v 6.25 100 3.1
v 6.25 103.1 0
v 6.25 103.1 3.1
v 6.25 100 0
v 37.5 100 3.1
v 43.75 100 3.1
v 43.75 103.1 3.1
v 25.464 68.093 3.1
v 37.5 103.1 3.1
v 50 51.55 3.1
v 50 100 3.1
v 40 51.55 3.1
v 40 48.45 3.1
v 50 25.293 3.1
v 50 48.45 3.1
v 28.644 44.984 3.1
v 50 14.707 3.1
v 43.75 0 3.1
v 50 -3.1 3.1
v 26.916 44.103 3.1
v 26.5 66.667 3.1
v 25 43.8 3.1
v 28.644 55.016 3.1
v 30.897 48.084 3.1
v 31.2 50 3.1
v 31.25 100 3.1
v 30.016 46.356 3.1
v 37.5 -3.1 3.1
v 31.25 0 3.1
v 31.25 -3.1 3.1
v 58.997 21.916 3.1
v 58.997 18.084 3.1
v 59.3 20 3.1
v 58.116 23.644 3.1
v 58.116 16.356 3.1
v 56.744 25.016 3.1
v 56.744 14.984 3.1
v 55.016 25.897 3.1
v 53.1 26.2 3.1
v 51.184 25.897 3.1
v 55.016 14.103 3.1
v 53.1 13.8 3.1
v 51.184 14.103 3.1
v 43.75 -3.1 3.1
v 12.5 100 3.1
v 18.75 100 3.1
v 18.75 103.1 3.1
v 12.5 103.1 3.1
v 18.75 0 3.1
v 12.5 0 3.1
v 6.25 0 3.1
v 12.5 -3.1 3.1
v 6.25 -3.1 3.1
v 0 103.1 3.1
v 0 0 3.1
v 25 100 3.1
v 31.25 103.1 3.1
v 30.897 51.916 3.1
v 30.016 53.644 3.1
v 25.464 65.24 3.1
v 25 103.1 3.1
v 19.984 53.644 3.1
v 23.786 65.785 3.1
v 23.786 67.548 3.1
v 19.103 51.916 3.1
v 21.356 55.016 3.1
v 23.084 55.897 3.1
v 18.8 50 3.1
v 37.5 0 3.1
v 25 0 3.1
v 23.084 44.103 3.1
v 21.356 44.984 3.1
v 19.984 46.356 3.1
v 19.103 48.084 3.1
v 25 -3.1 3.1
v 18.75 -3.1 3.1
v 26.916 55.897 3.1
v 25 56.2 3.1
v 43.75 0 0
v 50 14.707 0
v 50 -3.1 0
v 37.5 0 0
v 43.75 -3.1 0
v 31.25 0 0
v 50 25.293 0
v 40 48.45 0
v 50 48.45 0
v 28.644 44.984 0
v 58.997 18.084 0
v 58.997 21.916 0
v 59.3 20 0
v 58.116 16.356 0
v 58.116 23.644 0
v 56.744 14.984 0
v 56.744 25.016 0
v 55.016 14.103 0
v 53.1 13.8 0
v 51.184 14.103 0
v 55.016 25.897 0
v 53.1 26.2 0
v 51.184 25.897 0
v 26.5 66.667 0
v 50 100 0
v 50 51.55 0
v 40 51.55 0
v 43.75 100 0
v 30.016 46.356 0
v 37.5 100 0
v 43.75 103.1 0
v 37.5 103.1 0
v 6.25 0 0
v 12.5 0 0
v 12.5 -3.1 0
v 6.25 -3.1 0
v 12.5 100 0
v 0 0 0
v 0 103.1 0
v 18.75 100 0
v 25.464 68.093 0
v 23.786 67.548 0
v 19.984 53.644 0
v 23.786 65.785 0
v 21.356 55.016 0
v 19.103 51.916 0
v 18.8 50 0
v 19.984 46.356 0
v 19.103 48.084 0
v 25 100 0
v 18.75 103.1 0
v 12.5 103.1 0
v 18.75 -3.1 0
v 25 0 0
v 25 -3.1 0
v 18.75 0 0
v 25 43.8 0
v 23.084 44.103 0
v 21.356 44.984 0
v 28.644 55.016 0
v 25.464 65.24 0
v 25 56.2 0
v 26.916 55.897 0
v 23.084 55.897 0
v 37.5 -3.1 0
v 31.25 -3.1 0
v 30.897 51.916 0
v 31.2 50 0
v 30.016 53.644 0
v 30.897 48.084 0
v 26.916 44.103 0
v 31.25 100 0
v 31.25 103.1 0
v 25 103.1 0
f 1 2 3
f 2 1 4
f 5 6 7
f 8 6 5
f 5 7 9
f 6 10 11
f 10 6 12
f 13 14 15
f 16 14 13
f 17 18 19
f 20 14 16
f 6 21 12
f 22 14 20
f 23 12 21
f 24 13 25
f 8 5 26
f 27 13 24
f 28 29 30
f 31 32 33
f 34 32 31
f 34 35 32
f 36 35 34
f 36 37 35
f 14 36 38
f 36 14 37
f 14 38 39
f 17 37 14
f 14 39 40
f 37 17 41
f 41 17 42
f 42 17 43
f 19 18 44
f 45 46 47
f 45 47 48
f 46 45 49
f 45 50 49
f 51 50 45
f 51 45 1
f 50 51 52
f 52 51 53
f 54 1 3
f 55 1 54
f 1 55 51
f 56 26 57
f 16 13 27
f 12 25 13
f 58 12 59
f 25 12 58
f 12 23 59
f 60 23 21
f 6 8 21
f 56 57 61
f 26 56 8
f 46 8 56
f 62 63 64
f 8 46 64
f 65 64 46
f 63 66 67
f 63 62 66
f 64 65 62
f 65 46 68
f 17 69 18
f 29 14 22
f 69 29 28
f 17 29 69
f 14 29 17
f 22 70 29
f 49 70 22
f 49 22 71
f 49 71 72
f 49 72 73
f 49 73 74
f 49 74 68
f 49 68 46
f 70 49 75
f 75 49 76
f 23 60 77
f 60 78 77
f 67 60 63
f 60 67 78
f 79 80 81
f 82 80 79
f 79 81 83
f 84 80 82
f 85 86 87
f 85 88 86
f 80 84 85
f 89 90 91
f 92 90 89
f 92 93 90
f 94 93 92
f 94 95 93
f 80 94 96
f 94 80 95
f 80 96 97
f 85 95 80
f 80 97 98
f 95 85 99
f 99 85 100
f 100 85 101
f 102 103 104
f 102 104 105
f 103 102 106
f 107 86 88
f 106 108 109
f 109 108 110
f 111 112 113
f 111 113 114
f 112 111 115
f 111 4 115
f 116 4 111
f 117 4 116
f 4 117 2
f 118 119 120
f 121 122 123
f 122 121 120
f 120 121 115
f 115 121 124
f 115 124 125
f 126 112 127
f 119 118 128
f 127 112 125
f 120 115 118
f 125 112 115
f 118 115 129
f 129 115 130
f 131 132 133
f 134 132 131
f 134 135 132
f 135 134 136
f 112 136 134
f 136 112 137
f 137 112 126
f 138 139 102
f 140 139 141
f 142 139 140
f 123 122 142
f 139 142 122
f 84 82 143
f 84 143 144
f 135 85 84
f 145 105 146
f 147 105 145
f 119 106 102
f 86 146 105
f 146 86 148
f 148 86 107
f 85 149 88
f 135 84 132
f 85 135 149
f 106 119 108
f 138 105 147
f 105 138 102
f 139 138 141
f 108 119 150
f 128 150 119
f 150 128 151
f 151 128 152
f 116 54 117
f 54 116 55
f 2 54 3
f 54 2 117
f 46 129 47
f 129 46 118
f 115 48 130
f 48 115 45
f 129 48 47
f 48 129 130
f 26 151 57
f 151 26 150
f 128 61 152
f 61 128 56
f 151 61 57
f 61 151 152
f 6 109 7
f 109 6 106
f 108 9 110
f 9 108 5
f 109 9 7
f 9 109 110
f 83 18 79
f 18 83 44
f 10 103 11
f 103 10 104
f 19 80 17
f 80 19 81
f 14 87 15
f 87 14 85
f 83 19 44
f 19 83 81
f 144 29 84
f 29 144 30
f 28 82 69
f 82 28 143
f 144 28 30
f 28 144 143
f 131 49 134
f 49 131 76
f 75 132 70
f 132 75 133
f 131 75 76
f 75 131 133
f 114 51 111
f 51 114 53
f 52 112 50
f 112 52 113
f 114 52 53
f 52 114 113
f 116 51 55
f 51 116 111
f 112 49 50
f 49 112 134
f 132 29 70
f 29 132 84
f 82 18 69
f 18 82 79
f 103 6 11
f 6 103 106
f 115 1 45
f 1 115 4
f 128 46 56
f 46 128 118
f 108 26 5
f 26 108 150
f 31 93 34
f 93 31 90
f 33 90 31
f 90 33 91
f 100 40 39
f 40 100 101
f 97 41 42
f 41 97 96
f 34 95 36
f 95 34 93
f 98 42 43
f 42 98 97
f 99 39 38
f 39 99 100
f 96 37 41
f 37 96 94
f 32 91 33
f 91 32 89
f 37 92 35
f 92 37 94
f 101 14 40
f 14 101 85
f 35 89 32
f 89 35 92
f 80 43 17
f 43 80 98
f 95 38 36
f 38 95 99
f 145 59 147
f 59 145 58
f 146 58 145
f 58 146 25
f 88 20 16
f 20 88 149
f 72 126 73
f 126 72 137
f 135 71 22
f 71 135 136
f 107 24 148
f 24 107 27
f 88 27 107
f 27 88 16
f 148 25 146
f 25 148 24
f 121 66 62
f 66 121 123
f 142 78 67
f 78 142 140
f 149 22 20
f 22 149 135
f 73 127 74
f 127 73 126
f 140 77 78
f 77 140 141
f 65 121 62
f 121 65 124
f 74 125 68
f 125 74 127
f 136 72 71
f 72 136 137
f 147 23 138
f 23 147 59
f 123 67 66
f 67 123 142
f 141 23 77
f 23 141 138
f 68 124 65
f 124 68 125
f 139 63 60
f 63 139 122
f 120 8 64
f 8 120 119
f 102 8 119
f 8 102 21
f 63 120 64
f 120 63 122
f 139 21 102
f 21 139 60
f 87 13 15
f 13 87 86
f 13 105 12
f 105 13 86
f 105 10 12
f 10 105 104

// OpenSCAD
include <../lasercut.scad>; 

thickness = 3.1;
x = 50;
y = 100;
r = thickness*2;
lasercutoutSquare(thickness=thickness, x=x, y=y,
    finger_joints=[
            [UP, 1, 4],
            [DOWN, 1, 4]
        ],
    circles_add = [
            [r, x+thickness, y/5],
        ],
    circles_remove = [
            [r, x/2, y/2],
            [1.5, x/2, y*2/3], // Screw-hole
        ],
    slits = [
            [RIGHT,x,y/2,10]
        ]
    );
    
